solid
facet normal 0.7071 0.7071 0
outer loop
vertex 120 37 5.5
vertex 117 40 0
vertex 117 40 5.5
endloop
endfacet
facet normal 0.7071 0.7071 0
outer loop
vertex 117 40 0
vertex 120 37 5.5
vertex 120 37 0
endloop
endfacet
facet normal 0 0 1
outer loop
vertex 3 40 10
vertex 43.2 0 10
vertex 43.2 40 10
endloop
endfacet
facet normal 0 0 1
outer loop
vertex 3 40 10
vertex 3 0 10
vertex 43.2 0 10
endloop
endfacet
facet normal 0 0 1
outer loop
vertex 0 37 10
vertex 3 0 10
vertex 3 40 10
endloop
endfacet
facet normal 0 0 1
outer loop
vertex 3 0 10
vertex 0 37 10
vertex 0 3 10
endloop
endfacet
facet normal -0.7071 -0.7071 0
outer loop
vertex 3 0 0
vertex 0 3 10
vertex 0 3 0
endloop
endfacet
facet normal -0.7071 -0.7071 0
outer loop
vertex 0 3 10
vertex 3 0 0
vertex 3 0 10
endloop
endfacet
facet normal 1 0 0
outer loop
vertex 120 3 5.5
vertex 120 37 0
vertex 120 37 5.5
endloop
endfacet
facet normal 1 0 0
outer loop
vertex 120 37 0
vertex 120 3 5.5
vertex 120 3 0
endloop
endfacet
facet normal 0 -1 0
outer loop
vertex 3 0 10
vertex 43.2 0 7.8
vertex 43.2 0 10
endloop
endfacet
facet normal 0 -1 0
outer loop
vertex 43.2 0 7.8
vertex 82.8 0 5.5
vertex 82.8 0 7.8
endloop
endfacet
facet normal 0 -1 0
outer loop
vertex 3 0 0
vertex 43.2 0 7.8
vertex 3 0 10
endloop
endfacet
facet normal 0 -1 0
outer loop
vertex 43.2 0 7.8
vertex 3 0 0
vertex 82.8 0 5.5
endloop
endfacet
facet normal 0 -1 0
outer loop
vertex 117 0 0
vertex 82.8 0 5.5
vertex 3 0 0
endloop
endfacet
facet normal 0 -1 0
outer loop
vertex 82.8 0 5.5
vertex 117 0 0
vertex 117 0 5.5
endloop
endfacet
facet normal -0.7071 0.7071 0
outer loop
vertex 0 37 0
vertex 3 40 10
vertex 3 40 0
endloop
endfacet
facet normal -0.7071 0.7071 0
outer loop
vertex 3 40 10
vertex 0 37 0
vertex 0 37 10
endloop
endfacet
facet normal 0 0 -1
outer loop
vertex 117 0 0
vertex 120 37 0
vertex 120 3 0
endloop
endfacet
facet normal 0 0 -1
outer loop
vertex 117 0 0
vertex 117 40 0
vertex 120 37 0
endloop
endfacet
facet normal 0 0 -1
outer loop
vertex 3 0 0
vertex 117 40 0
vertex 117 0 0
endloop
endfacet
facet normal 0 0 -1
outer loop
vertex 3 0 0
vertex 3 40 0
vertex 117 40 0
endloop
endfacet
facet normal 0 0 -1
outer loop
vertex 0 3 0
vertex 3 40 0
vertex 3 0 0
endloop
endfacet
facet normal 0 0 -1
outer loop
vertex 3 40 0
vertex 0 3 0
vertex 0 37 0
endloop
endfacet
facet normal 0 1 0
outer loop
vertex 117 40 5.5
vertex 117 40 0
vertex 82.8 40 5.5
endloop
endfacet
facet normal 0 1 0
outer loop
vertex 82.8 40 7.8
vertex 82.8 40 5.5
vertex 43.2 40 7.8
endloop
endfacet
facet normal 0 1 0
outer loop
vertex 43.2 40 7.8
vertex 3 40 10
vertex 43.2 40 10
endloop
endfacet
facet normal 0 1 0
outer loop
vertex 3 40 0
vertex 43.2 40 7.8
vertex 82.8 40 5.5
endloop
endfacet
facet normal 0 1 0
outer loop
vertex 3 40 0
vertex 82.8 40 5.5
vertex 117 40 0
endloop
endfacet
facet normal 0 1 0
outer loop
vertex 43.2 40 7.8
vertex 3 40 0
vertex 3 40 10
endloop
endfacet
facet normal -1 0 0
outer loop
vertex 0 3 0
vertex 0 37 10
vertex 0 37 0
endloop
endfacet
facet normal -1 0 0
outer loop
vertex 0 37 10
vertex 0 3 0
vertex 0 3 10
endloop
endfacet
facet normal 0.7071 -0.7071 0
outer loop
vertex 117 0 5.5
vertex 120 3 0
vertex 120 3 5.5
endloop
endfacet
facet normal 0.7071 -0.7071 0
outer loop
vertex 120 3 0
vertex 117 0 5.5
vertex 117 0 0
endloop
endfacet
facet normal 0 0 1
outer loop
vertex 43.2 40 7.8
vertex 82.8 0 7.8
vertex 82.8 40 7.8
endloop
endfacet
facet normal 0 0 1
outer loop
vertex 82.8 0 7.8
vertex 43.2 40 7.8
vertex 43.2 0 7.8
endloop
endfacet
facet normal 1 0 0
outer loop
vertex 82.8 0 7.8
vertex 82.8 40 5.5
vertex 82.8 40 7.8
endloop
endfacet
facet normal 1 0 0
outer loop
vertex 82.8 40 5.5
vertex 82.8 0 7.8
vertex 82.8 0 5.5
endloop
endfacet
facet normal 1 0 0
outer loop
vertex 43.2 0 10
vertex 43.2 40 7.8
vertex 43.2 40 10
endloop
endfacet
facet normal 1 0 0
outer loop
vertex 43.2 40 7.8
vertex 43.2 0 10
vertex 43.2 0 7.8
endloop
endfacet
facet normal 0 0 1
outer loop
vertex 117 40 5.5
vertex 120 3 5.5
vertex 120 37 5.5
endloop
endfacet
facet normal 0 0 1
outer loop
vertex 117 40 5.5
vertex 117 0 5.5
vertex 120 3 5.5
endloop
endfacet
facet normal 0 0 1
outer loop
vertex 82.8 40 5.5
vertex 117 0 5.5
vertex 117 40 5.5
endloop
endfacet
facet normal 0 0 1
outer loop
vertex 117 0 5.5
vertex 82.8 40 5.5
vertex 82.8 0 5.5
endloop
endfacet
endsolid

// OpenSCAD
$fn = 32;

// ----------------------------------------------------------------------
// Stepped bar: twostep, 120 x 40 x 10/5.5 mm
// ----------------------------------------------------------------------

// --- parameters (mm) ---
bar_l = 120;              // bar length, X
bar_w = 40;               // bar width, Y
plate_t = 10;             // thickness of the thick zone, Z
thin_t = 5.5;             // thickness of the thin zone
corner_c = 3;             // corner chamfer of the bar
step_cut = 4.5;           // material removed from the thin zone
stair1_x = 43.2;          // position of the first stair
stair2_x = 82.8;          // position of the second stair
mid_t = 7.8;              // thickness of the middle zone
depth_1 = 2.2;            // depth of cut 1 from the top face
depth_2 = 4.5;            // depth of cut 2 from the top face

profile = [[3, 0], [117, 0], [120, 3], [120, 37], [117, 40], [3, 40], [0, 37], [0, 3]];  // primary outline, 8 points, counter clockwise
void_1 = [[43.2, -1], [82.8, -1], [82.8, 41], [43.2, 41]];  // first stair, 4 points
void_2 = [[82.8, -1], [121, -1], [121, 41], [82.8, 41]];  // second stair, 4 points

// --- the one profile operation ---
difference() {
  linear_extrude(height = plate_t) polygon(points = profile);
  translate([0, 0, plate_t - depth_1])
    linear_extrude(height = depth_1 + 1) polygon(points = void_1);
  translate([0, 0, plate_t - depth_2])
    linear_extrude(height = depth_2 + 1) polygon(points = void_2);
}
